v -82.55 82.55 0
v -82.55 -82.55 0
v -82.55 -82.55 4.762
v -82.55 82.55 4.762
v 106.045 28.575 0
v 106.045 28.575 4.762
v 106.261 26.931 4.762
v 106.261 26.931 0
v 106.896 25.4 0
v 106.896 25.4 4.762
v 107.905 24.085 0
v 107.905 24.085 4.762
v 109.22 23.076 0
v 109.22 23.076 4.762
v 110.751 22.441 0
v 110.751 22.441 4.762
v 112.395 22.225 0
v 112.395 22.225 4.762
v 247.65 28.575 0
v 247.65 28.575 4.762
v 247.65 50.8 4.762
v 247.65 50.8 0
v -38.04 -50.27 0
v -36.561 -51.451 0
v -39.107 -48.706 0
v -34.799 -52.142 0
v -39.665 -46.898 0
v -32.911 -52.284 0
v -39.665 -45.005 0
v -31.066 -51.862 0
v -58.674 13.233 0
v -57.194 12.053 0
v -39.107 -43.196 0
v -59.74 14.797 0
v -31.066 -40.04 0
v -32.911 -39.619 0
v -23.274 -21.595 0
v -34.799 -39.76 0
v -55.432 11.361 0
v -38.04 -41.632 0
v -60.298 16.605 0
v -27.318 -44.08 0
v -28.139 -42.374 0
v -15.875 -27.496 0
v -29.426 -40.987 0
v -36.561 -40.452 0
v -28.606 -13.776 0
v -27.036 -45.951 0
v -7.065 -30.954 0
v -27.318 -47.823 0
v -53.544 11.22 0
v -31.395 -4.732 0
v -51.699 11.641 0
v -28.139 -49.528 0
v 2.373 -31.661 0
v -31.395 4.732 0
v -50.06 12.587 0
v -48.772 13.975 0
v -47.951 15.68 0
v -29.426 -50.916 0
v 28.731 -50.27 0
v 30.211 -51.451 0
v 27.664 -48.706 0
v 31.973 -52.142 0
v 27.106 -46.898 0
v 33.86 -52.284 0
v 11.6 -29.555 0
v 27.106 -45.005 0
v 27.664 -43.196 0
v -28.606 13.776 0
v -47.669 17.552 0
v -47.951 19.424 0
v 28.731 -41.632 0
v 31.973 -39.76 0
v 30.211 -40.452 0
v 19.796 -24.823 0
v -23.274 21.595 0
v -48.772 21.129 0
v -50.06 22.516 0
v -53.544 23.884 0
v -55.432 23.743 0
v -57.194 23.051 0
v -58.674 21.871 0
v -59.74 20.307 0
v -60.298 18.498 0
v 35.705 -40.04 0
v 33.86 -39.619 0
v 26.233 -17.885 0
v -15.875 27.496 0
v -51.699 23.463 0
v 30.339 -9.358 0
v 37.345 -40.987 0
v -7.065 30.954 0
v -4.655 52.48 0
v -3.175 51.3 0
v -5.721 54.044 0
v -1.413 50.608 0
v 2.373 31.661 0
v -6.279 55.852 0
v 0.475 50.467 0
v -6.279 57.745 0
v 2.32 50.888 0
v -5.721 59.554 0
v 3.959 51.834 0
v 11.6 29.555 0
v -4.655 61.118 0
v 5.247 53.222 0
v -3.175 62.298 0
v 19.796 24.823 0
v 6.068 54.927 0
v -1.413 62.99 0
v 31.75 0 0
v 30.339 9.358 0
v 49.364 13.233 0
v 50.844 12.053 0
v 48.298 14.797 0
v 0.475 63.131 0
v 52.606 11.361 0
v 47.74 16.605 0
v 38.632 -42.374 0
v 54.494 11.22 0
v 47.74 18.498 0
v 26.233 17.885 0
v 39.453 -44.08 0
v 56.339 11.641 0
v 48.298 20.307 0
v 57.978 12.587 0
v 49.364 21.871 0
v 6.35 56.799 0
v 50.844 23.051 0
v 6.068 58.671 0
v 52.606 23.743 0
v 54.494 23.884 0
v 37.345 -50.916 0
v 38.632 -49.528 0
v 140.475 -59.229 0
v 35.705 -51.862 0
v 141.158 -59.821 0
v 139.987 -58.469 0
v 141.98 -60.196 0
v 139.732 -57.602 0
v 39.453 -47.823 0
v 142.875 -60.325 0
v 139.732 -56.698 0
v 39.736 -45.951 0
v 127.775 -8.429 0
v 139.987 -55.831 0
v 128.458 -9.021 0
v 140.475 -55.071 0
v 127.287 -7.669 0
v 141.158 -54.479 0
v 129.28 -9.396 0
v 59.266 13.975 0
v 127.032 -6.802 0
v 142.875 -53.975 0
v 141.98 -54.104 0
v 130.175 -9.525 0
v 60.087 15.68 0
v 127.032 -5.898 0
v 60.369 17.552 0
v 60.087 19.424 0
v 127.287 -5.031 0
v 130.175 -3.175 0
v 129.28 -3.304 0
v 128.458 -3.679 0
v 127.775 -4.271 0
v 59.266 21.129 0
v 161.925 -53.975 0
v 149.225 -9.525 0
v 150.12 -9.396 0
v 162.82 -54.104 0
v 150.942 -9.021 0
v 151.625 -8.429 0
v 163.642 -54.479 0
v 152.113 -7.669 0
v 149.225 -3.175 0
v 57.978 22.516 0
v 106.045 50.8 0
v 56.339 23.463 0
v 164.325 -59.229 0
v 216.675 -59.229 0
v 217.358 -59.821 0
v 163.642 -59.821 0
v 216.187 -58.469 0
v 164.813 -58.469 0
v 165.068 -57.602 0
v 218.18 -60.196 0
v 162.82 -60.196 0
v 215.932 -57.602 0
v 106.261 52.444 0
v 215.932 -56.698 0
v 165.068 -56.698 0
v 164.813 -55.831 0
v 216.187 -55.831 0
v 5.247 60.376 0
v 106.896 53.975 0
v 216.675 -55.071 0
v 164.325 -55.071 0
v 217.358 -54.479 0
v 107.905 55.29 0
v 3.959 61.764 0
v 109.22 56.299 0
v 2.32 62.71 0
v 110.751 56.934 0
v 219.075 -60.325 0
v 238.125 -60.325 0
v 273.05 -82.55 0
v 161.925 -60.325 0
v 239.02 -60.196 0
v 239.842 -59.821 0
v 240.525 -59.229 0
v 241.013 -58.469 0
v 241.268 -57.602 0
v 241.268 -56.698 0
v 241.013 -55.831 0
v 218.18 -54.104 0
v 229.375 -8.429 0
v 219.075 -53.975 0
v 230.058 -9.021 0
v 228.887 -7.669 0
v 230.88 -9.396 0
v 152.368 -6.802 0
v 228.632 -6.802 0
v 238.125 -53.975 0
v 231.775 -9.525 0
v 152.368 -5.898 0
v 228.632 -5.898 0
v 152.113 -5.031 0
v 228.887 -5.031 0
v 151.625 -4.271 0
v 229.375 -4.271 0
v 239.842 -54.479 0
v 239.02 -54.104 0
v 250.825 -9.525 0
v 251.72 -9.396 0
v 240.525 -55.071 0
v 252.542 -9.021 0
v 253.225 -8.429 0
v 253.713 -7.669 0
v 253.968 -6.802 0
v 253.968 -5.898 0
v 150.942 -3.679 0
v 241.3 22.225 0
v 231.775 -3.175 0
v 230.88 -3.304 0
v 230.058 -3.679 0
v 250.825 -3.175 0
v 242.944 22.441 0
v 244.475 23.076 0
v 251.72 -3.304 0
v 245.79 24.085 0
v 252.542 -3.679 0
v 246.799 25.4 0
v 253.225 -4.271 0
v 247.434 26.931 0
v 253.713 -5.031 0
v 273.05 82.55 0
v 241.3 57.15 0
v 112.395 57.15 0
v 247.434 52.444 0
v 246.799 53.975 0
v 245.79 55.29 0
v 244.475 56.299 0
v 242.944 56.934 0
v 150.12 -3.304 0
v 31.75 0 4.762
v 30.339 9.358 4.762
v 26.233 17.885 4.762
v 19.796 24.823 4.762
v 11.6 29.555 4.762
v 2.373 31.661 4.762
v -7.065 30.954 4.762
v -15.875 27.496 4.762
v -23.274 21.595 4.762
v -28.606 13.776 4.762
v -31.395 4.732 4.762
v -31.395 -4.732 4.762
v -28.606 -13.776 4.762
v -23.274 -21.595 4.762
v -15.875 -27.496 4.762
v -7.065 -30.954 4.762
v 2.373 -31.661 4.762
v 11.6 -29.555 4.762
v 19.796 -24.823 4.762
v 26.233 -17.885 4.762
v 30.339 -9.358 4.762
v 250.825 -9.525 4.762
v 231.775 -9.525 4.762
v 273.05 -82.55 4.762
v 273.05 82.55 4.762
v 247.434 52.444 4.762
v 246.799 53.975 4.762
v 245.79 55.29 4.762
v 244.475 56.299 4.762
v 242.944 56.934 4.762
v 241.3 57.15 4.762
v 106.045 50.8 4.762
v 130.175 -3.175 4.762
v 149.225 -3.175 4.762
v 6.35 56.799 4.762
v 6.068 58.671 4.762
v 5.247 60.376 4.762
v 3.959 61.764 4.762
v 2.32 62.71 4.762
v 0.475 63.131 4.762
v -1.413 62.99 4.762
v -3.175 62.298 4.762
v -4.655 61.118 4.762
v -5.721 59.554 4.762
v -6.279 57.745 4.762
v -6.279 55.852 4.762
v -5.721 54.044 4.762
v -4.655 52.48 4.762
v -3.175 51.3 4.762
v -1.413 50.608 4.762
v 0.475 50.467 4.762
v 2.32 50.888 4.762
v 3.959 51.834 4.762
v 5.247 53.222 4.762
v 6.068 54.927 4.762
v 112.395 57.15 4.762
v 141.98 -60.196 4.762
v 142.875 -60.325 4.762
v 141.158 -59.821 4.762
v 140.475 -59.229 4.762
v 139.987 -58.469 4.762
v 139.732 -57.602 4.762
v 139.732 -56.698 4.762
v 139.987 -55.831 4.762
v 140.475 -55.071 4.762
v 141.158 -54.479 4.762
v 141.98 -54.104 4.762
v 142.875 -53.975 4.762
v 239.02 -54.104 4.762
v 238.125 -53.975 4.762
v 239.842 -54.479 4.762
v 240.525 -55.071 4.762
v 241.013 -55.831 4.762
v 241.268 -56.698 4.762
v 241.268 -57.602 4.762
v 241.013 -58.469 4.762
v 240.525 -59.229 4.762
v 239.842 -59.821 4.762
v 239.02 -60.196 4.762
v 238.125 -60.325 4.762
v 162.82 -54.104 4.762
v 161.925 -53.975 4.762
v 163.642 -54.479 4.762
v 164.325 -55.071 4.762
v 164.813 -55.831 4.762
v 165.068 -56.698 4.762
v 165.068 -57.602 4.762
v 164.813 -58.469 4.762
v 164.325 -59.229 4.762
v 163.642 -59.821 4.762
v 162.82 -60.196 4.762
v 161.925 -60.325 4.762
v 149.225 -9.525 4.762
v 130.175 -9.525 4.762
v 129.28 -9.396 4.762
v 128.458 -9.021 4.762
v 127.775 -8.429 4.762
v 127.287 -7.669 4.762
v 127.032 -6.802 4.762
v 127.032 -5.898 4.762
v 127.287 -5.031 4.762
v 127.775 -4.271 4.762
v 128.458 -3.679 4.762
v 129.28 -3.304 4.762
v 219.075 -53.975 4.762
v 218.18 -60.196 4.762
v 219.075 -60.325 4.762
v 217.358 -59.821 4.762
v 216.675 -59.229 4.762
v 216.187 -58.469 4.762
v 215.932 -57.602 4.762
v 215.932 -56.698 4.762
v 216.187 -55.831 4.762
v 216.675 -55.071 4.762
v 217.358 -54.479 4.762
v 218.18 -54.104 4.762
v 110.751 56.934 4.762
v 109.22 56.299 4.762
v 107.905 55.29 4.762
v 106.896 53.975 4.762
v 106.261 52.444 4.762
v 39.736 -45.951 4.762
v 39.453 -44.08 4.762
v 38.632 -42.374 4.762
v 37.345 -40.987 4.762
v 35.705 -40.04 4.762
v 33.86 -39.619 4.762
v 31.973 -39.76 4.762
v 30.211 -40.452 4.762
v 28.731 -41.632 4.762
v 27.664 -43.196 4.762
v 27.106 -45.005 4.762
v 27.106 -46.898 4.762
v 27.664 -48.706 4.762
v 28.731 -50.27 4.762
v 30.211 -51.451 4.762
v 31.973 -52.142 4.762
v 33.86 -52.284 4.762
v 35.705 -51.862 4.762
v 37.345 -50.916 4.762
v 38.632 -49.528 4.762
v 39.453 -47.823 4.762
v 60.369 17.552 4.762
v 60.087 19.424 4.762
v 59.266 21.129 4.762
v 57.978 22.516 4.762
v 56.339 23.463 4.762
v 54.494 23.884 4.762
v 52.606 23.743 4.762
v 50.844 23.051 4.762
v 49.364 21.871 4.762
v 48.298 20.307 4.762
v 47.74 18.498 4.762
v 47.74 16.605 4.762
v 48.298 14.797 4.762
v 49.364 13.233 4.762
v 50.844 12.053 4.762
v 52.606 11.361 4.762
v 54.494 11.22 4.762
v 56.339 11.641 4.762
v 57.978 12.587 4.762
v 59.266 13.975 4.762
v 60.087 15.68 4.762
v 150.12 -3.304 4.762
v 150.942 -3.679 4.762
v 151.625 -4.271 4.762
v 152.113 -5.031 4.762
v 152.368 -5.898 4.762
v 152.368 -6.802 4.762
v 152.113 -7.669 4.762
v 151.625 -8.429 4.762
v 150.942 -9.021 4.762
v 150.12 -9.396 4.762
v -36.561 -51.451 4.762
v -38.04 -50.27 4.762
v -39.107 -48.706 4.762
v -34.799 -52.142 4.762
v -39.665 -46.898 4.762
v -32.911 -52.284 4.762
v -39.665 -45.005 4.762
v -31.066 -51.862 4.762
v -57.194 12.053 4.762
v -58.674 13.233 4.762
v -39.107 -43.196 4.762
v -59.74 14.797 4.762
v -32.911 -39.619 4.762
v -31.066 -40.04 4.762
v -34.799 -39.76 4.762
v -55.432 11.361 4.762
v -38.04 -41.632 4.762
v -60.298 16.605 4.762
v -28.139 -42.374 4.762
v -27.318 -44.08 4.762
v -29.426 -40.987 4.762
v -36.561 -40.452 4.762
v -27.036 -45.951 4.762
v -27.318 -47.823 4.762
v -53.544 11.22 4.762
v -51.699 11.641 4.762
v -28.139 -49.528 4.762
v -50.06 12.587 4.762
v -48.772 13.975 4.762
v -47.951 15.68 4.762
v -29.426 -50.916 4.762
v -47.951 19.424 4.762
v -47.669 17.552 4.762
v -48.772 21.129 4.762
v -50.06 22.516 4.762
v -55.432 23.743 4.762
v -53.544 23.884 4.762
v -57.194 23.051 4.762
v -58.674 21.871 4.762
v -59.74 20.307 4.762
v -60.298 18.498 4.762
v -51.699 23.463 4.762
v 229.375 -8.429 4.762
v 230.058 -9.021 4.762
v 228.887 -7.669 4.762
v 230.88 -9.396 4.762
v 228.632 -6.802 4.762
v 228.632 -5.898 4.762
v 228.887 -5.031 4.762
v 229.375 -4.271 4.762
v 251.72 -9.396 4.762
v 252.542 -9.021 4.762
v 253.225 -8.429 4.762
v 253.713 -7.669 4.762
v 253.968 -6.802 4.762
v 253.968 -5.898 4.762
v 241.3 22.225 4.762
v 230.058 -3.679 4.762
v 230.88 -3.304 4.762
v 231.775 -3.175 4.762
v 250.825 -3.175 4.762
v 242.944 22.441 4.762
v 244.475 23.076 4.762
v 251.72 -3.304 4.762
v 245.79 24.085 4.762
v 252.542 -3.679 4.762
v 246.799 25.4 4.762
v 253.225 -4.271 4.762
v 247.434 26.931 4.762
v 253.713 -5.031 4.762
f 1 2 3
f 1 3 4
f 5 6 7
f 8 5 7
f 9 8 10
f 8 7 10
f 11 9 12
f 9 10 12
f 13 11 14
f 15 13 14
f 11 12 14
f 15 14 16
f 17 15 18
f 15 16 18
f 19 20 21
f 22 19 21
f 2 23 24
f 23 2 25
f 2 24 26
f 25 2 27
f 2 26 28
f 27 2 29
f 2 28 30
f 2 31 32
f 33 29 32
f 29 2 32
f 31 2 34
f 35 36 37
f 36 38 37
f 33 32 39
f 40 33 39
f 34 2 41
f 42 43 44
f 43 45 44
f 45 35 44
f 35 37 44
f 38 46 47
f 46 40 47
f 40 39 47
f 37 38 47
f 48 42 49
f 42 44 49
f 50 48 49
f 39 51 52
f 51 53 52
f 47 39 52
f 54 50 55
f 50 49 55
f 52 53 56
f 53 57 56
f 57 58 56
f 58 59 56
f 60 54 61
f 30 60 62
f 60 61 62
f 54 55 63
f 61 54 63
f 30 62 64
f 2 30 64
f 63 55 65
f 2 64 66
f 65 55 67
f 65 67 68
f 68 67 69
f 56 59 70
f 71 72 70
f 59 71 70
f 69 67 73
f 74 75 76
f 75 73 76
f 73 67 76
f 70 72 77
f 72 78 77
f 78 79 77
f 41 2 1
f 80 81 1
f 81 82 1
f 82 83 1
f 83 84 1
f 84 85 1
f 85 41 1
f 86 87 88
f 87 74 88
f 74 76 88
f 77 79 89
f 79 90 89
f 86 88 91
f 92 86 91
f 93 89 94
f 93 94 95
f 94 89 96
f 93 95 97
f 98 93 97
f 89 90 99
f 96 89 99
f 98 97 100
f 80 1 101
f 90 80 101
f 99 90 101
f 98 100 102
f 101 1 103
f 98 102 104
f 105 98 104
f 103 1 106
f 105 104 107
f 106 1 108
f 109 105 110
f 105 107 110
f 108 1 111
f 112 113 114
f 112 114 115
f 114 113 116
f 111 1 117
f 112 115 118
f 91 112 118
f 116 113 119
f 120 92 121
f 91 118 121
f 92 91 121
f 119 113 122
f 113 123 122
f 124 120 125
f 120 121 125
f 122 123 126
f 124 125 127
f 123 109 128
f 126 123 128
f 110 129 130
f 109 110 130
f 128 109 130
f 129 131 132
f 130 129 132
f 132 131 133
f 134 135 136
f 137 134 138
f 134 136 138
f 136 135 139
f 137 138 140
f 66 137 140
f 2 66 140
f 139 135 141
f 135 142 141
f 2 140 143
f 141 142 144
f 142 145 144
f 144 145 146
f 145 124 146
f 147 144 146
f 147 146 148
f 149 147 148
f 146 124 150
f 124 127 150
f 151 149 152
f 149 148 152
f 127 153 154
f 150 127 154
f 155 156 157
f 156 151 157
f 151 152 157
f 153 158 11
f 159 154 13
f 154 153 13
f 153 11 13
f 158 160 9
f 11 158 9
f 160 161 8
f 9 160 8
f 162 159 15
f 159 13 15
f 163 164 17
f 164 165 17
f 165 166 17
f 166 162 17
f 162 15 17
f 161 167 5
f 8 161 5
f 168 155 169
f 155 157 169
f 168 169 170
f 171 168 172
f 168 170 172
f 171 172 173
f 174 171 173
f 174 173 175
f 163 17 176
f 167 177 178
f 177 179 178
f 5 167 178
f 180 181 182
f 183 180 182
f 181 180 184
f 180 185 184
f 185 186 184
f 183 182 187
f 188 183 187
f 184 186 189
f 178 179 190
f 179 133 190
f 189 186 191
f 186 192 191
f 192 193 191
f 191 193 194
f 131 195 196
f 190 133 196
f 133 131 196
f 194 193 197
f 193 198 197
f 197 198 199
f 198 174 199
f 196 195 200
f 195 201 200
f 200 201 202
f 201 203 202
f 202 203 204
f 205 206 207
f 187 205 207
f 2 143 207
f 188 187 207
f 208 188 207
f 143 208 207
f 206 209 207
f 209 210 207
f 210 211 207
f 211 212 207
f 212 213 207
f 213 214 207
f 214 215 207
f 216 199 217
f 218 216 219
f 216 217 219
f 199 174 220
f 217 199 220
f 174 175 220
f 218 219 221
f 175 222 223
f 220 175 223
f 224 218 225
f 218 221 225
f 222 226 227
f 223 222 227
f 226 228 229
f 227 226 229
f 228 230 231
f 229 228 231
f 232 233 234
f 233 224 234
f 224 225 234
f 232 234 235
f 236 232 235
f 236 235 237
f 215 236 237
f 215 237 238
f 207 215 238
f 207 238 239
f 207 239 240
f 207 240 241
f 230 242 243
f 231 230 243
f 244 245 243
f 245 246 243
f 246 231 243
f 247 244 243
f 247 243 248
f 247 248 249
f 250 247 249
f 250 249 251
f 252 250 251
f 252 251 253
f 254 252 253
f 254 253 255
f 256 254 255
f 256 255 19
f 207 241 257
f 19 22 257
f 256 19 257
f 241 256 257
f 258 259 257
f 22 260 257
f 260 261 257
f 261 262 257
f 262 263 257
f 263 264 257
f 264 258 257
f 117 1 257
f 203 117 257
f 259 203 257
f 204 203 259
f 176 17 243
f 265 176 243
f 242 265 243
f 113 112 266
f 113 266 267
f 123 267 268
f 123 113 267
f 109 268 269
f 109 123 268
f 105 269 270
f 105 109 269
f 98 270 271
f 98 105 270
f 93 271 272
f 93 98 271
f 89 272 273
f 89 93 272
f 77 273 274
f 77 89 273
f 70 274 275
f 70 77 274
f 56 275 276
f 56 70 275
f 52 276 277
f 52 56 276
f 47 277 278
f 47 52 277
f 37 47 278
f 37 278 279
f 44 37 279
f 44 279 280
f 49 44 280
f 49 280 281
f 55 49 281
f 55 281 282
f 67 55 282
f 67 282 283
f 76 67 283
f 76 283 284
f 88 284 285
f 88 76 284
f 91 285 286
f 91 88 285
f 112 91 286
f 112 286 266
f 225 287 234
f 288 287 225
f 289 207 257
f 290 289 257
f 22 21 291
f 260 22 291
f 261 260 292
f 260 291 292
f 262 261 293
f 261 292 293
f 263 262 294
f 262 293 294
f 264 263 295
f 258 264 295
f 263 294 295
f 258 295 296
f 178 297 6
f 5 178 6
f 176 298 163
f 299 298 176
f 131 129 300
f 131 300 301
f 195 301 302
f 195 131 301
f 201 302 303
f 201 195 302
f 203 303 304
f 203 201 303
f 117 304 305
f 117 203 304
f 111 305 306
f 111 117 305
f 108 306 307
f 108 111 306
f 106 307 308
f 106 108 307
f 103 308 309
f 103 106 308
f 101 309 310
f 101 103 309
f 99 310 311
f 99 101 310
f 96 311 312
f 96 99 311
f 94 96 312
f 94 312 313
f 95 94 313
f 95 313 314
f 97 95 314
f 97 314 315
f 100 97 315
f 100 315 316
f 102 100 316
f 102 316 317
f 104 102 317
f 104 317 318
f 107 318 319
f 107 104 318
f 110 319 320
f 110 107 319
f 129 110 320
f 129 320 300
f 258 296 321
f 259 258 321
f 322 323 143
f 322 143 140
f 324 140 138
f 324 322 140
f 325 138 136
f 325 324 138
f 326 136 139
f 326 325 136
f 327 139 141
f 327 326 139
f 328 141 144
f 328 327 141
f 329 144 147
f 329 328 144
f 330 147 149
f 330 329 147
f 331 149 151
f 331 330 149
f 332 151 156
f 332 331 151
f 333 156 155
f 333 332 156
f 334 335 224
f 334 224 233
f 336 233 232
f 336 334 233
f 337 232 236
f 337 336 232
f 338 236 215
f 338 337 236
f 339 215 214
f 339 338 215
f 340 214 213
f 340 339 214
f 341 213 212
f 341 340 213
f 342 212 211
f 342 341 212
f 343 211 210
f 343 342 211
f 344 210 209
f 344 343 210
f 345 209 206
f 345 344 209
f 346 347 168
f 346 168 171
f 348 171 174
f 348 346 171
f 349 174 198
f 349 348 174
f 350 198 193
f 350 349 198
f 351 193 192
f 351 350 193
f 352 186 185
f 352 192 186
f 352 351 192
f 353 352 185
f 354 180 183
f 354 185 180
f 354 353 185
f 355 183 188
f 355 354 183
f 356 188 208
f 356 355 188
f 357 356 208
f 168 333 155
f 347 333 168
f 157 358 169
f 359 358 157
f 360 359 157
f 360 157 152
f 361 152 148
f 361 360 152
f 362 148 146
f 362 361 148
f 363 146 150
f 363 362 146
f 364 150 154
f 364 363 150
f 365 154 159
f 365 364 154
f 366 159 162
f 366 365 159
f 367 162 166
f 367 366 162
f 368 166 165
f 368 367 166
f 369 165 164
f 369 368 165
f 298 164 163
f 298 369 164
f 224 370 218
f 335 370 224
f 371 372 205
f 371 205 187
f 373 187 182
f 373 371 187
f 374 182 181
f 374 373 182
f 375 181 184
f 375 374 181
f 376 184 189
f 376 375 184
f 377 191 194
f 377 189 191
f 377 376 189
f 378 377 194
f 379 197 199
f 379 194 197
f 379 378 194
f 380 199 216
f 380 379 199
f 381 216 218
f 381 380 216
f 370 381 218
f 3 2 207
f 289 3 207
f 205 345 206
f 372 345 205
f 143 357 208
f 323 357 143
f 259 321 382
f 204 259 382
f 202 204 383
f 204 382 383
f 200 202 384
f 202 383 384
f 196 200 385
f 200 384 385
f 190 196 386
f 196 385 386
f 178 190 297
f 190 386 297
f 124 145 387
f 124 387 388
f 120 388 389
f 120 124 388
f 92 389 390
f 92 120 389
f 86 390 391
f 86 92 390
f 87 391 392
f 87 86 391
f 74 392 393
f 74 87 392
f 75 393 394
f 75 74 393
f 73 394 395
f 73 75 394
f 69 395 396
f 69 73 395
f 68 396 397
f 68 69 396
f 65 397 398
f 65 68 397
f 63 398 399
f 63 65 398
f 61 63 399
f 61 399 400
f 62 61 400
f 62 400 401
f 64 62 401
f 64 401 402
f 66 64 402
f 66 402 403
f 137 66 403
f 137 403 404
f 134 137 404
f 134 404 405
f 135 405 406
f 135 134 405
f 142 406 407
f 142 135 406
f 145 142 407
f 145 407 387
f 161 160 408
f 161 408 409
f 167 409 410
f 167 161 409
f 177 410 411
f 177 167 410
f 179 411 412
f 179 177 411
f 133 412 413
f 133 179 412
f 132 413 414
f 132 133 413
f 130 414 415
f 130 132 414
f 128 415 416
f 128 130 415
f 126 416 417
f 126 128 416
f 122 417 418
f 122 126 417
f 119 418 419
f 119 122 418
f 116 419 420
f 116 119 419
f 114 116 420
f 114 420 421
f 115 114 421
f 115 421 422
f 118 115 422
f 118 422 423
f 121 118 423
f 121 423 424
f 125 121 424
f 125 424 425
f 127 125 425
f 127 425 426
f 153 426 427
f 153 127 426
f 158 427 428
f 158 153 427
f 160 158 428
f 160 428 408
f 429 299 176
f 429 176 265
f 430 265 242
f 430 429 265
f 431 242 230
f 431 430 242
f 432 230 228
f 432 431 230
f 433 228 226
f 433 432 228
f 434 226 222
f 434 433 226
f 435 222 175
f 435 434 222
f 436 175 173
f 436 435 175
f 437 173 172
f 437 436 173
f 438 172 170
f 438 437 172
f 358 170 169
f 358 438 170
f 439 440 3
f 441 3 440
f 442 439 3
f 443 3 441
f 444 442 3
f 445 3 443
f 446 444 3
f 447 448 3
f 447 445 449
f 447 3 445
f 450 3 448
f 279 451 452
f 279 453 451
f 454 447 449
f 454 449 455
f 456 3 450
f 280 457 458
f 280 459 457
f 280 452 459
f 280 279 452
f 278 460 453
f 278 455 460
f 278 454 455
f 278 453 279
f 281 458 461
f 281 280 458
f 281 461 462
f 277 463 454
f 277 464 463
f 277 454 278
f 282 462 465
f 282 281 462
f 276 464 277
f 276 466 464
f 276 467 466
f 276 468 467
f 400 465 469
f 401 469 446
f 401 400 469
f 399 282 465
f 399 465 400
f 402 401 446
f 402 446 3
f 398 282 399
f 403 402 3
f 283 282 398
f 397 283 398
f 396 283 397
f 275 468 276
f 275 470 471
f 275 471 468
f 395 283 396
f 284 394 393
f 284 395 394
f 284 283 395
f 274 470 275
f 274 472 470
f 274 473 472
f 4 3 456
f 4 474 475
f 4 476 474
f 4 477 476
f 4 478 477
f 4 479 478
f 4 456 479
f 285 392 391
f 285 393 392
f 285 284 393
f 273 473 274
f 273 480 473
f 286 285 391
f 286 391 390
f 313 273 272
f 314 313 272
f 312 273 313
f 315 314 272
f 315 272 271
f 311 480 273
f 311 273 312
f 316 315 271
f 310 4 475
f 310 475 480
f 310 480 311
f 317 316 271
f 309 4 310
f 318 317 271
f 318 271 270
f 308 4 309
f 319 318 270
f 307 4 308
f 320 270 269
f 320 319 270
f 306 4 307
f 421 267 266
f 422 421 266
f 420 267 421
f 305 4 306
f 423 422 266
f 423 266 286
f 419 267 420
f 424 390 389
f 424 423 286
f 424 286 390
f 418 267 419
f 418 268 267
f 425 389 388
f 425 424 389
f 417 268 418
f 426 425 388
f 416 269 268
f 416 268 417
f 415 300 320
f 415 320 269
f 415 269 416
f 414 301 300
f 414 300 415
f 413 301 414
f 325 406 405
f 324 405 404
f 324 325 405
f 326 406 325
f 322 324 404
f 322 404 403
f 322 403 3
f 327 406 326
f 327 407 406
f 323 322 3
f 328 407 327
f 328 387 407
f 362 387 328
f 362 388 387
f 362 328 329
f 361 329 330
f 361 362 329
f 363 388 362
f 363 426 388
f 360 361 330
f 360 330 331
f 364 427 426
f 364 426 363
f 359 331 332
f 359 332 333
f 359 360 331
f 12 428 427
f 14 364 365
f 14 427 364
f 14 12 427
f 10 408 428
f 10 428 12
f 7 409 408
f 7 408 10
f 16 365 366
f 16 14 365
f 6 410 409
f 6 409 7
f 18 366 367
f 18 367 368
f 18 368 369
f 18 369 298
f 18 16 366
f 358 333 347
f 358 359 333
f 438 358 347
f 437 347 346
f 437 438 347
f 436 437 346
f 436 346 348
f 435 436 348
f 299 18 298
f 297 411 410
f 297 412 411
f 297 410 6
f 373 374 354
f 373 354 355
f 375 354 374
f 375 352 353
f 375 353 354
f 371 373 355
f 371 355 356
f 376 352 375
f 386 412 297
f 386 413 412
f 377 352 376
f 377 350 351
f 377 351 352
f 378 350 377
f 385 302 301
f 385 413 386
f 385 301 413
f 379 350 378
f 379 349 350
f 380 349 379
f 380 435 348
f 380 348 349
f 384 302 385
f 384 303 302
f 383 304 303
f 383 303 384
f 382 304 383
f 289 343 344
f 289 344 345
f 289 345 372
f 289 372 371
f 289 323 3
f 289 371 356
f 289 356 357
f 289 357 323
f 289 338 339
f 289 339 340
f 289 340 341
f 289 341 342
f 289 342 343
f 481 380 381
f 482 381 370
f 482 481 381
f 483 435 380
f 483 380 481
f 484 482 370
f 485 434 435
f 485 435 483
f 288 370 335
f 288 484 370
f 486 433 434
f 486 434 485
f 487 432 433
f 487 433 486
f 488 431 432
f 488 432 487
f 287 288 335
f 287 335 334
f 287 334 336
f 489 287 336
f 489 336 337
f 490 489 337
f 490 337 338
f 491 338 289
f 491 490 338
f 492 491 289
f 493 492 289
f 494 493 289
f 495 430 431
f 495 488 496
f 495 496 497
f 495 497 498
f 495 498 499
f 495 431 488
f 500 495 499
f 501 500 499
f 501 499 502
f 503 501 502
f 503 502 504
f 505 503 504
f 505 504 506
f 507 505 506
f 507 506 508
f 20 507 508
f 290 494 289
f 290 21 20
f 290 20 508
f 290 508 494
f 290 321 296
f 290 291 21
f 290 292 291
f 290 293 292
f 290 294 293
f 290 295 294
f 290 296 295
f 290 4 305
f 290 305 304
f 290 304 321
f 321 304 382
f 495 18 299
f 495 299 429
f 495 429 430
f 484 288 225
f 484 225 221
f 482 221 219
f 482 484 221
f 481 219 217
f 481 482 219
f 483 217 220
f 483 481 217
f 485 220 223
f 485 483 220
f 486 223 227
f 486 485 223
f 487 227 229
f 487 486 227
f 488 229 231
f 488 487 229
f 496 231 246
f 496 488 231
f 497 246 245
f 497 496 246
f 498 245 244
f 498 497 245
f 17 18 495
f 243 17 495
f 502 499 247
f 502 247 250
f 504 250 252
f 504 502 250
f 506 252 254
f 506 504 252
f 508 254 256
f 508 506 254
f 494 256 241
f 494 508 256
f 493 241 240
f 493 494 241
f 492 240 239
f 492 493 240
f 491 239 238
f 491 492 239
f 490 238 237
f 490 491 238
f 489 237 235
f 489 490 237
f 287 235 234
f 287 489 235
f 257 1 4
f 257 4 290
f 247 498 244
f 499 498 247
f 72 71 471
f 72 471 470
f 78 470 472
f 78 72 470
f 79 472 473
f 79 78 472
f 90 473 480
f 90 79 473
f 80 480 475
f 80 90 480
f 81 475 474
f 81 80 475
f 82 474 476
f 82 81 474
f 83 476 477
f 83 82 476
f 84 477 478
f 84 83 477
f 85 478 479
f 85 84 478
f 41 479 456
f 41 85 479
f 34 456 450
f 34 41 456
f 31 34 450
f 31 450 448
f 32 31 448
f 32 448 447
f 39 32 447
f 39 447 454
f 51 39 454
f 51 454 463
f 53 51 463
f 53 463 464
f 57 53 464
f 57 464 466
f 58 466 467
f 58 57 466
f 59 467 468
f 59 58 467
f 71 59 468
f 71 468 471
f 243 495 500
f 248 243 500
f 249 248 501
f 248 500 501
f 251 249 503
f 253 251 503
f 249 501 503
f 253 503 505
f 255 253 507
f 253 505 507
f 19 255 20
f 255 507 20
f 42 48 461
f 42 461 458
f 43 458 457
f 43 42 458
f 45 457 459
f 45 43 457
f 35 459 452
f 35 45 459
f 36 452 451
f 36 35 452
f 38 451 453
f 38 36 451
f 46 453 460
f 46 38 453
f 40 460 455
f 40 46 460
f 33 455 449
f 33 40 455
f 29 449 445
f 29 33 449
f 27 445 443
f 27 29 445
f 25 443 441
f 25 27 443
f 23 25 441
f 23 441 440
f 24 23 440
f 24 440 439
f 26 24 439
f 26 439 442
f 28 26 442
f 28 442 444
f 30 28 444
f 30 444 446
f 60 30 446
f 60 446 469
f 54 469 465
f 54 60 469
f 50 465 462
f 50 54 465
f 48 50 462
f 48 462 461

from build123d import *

# Parameters (mm, degrees)
SKETCH2_W           = 355.6
SKETCH2_H           = 165.1
SKETCH2_R           = 31.75
SKETCH2_R_2         = 6.35
BOSS_EXTRUDE1_DEPTH = 4.7625
CUT_EXTRUDE1_DEPTH  = 5.7625
CUT_EXTRUDE3_DEPTH  = 5.7625


with BuildPart() as part:
    # Sketch2 → Boss-Extrude1 (new body)
    with BuildSketch(Plane.XY):
        with Locations((95.25, 0)):
            Rectangle(SKETCH2_W, SKETCH2_H)
        Circle(SKETCH2_R, mode=Mode.SUBTRACT)
        with Locations((-54.018973032, 17.551828308)):
            Circle(SKETCH2_R_2, mode=Mode.SUBTRACT)
        with Locations((0, 56.798909535)):
            Circle(SKETCH2_R_2, mode=Mode.SUBTRACT)
        with Locations((54.018973032, 17.551828308)):
            Circle(SKETCH2_R_2, mode=Mode.SUBTRACT)
        with Locations((33.385561371, -45.951283076)):
            Circle(SKETCH2_R_2, mode=Mode.SUBTRACT)
        with Locations((-33.385561371, -45.951283076)):
            Circle(SKETCH2_R_2, mode=Mode.SUBTRACT)
    extrude(amount=BOSS_EXTRUDE1_DEPTH)

    # Sketch3 → Cut-Extrude1 (cut, through all)
    with BuildSketch(Plane.XY.offset(4.7625)):
        with BuildLine():
            Line((149.225, -9.525), (130.175, -9.525))
            ThreePointArc((130.175, -9.525), (127, -6.35), (130.175, -3.175))
            Line((130.175, -3.175), (149.225, -3.175))
            ThreePointArc((149.225, -3.175), (152.4, -6.35), (149.225, -9.525))
        make_face()
        with BuildLine():
            Line((250.825, -9.525), (231.775, -9.525))
            ThreePointArc((231.775, -9.525), (228.6, -6.35), (231.775, -3.175))
            Line((231.775, -3.175), (250.825, -3.175))
            ThreePointArc((250.825, -3.175), (254, -6.35), (250.825, -9.525))
        make_face()
        with BuildLine():
            Line((238.125, -60.325), (219.075, -60.325))
            ThreePointArc((219.075, -60.325), (215.9, -57.15), (219.075, -53.975))
            Line((219.075, -53.975), (238.125, -53.975))
            ThreePointArc((238.125, -53.975), (241.3, -57.15), (238.125, -60.325))
        make_face()
        with BuildLine():
            Line((142.875, -53.975), (161.925, -53.975))
            ThreePointArc((161.925, -53.975), (165.1, -57.15), (161.925, -60.325))
            Line((161.925, -60.325), (142.875, -60.325))
            ThreePointArc((142.875, -60.325), (139.7, -57.15), (142.875, -53.975))
        make_face()
    extrude(amount=-CUT_EXTRUDE1_DEPTH, mode=Mode.SUBTRACT)

    # Sketch4 → Cut-Extrude3 (cut, through all)
    with BuildSketch(Plane.XY.offset(4.7625)):
        with BuildLine():
            Line((247.65, 28.575), (247.65, 50.8))
            ThreePointArc((247.65, 50.8), (245.790128061, 55.290128061), (241.3, 57.15))
            Line((241.3, 57.15), (112.395, 57.15))
            ThreePointArc((112.395, 57.15), (107.904871939, 55.290128061), (106.045, 50.8))
            Line((106.045, 50.8), (106.045, 28.575))
            ThreePointArc((106.045, 28.575), (107.904871939, 24.084871939), (112.395, 22.225))
            Line((112.395, 22.225), (241.3, 22.225))
            ThreePointArc((241.3, 22.225), (245.790128061, 24.084871939), (247.65, 28.575))
        make_face()
    extrude(amount=-CUT_EXTRUDE3_DEPTH, mode=Mode.SUBTRACT)


solid = part.part
